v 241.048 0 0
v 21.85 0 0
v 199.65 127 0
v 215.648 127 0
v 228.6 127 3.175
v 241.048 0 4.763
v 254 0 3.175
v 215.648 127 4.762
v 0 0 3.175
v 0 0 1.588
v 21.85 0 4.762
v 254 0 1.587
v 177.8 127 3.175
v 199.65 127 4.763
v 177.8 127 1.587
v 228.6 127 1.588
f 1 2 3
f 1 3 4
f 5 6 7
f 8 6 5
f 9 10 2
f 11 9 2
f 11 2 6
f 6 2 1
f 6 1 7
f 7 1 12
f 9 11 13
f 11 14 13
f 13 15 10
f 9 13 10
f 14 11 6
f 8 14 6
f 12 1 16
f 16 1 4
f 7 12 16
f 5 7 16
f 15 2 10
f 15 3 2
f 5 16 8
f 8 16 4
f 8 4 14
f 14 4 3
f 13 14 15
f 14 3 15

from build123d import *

# Parameters (mm, degrees)
BOSS_EXTRUDE1_DEPTH = 4.7625
CHAMFER1_SIZE       = 1.5875
CHAMFER1_SIZE2      = 12.7
CHAMFER2_SIZE       = 1.5875
CHAMFER2_SIZE2      = 12.7


with BuildPart() as part:
    # Sketch1 → Boss-Extrude1 (new body)
    with BuildSketch(Plane.XY):
        Polygon((0, 0), (254, 0), (228.6, 127), (177.8, 127), align=None)
    extrude(amount=BOSS_EXTRUDE1_DEPTH)

    # Chamfer1
    chamfer1_edges = [part.edges().sort_by_distance(p)[0] for p in [
        (88.9, 63.5, 4.7625),
        (88.9, 63.5, 0),
    ]]
    chamfer1_side = [part.faces().sort_by_distance(p)[0] for p in [
        (88.9, 63.5, 2.38125),
    ]]
    chamfer(chamfer1_edges, length=CHAMFER1_SIZE, length2=CHAMFER1_SIZE2, reference=chamfer1_side[0])

    # Chamfer2
    chamfer2_edges = [part.edges().sort_by_distance(p)[0] for p in [
        (241.3, 63.5, 4.7625),
        (241.3, 63.5, 0),
    ]]
    chamfer2_side = [part.faces().sort_by_distance(p)[0] for p in [
        (241.3, 63.5, 2.38125),
    ]]
    chamfer(chamfer2_edges, length=CHAMFER2_SIZE, length2=CHAMFER2_SIZE2, reference=chamfer2_side[0])


solid = part.part
